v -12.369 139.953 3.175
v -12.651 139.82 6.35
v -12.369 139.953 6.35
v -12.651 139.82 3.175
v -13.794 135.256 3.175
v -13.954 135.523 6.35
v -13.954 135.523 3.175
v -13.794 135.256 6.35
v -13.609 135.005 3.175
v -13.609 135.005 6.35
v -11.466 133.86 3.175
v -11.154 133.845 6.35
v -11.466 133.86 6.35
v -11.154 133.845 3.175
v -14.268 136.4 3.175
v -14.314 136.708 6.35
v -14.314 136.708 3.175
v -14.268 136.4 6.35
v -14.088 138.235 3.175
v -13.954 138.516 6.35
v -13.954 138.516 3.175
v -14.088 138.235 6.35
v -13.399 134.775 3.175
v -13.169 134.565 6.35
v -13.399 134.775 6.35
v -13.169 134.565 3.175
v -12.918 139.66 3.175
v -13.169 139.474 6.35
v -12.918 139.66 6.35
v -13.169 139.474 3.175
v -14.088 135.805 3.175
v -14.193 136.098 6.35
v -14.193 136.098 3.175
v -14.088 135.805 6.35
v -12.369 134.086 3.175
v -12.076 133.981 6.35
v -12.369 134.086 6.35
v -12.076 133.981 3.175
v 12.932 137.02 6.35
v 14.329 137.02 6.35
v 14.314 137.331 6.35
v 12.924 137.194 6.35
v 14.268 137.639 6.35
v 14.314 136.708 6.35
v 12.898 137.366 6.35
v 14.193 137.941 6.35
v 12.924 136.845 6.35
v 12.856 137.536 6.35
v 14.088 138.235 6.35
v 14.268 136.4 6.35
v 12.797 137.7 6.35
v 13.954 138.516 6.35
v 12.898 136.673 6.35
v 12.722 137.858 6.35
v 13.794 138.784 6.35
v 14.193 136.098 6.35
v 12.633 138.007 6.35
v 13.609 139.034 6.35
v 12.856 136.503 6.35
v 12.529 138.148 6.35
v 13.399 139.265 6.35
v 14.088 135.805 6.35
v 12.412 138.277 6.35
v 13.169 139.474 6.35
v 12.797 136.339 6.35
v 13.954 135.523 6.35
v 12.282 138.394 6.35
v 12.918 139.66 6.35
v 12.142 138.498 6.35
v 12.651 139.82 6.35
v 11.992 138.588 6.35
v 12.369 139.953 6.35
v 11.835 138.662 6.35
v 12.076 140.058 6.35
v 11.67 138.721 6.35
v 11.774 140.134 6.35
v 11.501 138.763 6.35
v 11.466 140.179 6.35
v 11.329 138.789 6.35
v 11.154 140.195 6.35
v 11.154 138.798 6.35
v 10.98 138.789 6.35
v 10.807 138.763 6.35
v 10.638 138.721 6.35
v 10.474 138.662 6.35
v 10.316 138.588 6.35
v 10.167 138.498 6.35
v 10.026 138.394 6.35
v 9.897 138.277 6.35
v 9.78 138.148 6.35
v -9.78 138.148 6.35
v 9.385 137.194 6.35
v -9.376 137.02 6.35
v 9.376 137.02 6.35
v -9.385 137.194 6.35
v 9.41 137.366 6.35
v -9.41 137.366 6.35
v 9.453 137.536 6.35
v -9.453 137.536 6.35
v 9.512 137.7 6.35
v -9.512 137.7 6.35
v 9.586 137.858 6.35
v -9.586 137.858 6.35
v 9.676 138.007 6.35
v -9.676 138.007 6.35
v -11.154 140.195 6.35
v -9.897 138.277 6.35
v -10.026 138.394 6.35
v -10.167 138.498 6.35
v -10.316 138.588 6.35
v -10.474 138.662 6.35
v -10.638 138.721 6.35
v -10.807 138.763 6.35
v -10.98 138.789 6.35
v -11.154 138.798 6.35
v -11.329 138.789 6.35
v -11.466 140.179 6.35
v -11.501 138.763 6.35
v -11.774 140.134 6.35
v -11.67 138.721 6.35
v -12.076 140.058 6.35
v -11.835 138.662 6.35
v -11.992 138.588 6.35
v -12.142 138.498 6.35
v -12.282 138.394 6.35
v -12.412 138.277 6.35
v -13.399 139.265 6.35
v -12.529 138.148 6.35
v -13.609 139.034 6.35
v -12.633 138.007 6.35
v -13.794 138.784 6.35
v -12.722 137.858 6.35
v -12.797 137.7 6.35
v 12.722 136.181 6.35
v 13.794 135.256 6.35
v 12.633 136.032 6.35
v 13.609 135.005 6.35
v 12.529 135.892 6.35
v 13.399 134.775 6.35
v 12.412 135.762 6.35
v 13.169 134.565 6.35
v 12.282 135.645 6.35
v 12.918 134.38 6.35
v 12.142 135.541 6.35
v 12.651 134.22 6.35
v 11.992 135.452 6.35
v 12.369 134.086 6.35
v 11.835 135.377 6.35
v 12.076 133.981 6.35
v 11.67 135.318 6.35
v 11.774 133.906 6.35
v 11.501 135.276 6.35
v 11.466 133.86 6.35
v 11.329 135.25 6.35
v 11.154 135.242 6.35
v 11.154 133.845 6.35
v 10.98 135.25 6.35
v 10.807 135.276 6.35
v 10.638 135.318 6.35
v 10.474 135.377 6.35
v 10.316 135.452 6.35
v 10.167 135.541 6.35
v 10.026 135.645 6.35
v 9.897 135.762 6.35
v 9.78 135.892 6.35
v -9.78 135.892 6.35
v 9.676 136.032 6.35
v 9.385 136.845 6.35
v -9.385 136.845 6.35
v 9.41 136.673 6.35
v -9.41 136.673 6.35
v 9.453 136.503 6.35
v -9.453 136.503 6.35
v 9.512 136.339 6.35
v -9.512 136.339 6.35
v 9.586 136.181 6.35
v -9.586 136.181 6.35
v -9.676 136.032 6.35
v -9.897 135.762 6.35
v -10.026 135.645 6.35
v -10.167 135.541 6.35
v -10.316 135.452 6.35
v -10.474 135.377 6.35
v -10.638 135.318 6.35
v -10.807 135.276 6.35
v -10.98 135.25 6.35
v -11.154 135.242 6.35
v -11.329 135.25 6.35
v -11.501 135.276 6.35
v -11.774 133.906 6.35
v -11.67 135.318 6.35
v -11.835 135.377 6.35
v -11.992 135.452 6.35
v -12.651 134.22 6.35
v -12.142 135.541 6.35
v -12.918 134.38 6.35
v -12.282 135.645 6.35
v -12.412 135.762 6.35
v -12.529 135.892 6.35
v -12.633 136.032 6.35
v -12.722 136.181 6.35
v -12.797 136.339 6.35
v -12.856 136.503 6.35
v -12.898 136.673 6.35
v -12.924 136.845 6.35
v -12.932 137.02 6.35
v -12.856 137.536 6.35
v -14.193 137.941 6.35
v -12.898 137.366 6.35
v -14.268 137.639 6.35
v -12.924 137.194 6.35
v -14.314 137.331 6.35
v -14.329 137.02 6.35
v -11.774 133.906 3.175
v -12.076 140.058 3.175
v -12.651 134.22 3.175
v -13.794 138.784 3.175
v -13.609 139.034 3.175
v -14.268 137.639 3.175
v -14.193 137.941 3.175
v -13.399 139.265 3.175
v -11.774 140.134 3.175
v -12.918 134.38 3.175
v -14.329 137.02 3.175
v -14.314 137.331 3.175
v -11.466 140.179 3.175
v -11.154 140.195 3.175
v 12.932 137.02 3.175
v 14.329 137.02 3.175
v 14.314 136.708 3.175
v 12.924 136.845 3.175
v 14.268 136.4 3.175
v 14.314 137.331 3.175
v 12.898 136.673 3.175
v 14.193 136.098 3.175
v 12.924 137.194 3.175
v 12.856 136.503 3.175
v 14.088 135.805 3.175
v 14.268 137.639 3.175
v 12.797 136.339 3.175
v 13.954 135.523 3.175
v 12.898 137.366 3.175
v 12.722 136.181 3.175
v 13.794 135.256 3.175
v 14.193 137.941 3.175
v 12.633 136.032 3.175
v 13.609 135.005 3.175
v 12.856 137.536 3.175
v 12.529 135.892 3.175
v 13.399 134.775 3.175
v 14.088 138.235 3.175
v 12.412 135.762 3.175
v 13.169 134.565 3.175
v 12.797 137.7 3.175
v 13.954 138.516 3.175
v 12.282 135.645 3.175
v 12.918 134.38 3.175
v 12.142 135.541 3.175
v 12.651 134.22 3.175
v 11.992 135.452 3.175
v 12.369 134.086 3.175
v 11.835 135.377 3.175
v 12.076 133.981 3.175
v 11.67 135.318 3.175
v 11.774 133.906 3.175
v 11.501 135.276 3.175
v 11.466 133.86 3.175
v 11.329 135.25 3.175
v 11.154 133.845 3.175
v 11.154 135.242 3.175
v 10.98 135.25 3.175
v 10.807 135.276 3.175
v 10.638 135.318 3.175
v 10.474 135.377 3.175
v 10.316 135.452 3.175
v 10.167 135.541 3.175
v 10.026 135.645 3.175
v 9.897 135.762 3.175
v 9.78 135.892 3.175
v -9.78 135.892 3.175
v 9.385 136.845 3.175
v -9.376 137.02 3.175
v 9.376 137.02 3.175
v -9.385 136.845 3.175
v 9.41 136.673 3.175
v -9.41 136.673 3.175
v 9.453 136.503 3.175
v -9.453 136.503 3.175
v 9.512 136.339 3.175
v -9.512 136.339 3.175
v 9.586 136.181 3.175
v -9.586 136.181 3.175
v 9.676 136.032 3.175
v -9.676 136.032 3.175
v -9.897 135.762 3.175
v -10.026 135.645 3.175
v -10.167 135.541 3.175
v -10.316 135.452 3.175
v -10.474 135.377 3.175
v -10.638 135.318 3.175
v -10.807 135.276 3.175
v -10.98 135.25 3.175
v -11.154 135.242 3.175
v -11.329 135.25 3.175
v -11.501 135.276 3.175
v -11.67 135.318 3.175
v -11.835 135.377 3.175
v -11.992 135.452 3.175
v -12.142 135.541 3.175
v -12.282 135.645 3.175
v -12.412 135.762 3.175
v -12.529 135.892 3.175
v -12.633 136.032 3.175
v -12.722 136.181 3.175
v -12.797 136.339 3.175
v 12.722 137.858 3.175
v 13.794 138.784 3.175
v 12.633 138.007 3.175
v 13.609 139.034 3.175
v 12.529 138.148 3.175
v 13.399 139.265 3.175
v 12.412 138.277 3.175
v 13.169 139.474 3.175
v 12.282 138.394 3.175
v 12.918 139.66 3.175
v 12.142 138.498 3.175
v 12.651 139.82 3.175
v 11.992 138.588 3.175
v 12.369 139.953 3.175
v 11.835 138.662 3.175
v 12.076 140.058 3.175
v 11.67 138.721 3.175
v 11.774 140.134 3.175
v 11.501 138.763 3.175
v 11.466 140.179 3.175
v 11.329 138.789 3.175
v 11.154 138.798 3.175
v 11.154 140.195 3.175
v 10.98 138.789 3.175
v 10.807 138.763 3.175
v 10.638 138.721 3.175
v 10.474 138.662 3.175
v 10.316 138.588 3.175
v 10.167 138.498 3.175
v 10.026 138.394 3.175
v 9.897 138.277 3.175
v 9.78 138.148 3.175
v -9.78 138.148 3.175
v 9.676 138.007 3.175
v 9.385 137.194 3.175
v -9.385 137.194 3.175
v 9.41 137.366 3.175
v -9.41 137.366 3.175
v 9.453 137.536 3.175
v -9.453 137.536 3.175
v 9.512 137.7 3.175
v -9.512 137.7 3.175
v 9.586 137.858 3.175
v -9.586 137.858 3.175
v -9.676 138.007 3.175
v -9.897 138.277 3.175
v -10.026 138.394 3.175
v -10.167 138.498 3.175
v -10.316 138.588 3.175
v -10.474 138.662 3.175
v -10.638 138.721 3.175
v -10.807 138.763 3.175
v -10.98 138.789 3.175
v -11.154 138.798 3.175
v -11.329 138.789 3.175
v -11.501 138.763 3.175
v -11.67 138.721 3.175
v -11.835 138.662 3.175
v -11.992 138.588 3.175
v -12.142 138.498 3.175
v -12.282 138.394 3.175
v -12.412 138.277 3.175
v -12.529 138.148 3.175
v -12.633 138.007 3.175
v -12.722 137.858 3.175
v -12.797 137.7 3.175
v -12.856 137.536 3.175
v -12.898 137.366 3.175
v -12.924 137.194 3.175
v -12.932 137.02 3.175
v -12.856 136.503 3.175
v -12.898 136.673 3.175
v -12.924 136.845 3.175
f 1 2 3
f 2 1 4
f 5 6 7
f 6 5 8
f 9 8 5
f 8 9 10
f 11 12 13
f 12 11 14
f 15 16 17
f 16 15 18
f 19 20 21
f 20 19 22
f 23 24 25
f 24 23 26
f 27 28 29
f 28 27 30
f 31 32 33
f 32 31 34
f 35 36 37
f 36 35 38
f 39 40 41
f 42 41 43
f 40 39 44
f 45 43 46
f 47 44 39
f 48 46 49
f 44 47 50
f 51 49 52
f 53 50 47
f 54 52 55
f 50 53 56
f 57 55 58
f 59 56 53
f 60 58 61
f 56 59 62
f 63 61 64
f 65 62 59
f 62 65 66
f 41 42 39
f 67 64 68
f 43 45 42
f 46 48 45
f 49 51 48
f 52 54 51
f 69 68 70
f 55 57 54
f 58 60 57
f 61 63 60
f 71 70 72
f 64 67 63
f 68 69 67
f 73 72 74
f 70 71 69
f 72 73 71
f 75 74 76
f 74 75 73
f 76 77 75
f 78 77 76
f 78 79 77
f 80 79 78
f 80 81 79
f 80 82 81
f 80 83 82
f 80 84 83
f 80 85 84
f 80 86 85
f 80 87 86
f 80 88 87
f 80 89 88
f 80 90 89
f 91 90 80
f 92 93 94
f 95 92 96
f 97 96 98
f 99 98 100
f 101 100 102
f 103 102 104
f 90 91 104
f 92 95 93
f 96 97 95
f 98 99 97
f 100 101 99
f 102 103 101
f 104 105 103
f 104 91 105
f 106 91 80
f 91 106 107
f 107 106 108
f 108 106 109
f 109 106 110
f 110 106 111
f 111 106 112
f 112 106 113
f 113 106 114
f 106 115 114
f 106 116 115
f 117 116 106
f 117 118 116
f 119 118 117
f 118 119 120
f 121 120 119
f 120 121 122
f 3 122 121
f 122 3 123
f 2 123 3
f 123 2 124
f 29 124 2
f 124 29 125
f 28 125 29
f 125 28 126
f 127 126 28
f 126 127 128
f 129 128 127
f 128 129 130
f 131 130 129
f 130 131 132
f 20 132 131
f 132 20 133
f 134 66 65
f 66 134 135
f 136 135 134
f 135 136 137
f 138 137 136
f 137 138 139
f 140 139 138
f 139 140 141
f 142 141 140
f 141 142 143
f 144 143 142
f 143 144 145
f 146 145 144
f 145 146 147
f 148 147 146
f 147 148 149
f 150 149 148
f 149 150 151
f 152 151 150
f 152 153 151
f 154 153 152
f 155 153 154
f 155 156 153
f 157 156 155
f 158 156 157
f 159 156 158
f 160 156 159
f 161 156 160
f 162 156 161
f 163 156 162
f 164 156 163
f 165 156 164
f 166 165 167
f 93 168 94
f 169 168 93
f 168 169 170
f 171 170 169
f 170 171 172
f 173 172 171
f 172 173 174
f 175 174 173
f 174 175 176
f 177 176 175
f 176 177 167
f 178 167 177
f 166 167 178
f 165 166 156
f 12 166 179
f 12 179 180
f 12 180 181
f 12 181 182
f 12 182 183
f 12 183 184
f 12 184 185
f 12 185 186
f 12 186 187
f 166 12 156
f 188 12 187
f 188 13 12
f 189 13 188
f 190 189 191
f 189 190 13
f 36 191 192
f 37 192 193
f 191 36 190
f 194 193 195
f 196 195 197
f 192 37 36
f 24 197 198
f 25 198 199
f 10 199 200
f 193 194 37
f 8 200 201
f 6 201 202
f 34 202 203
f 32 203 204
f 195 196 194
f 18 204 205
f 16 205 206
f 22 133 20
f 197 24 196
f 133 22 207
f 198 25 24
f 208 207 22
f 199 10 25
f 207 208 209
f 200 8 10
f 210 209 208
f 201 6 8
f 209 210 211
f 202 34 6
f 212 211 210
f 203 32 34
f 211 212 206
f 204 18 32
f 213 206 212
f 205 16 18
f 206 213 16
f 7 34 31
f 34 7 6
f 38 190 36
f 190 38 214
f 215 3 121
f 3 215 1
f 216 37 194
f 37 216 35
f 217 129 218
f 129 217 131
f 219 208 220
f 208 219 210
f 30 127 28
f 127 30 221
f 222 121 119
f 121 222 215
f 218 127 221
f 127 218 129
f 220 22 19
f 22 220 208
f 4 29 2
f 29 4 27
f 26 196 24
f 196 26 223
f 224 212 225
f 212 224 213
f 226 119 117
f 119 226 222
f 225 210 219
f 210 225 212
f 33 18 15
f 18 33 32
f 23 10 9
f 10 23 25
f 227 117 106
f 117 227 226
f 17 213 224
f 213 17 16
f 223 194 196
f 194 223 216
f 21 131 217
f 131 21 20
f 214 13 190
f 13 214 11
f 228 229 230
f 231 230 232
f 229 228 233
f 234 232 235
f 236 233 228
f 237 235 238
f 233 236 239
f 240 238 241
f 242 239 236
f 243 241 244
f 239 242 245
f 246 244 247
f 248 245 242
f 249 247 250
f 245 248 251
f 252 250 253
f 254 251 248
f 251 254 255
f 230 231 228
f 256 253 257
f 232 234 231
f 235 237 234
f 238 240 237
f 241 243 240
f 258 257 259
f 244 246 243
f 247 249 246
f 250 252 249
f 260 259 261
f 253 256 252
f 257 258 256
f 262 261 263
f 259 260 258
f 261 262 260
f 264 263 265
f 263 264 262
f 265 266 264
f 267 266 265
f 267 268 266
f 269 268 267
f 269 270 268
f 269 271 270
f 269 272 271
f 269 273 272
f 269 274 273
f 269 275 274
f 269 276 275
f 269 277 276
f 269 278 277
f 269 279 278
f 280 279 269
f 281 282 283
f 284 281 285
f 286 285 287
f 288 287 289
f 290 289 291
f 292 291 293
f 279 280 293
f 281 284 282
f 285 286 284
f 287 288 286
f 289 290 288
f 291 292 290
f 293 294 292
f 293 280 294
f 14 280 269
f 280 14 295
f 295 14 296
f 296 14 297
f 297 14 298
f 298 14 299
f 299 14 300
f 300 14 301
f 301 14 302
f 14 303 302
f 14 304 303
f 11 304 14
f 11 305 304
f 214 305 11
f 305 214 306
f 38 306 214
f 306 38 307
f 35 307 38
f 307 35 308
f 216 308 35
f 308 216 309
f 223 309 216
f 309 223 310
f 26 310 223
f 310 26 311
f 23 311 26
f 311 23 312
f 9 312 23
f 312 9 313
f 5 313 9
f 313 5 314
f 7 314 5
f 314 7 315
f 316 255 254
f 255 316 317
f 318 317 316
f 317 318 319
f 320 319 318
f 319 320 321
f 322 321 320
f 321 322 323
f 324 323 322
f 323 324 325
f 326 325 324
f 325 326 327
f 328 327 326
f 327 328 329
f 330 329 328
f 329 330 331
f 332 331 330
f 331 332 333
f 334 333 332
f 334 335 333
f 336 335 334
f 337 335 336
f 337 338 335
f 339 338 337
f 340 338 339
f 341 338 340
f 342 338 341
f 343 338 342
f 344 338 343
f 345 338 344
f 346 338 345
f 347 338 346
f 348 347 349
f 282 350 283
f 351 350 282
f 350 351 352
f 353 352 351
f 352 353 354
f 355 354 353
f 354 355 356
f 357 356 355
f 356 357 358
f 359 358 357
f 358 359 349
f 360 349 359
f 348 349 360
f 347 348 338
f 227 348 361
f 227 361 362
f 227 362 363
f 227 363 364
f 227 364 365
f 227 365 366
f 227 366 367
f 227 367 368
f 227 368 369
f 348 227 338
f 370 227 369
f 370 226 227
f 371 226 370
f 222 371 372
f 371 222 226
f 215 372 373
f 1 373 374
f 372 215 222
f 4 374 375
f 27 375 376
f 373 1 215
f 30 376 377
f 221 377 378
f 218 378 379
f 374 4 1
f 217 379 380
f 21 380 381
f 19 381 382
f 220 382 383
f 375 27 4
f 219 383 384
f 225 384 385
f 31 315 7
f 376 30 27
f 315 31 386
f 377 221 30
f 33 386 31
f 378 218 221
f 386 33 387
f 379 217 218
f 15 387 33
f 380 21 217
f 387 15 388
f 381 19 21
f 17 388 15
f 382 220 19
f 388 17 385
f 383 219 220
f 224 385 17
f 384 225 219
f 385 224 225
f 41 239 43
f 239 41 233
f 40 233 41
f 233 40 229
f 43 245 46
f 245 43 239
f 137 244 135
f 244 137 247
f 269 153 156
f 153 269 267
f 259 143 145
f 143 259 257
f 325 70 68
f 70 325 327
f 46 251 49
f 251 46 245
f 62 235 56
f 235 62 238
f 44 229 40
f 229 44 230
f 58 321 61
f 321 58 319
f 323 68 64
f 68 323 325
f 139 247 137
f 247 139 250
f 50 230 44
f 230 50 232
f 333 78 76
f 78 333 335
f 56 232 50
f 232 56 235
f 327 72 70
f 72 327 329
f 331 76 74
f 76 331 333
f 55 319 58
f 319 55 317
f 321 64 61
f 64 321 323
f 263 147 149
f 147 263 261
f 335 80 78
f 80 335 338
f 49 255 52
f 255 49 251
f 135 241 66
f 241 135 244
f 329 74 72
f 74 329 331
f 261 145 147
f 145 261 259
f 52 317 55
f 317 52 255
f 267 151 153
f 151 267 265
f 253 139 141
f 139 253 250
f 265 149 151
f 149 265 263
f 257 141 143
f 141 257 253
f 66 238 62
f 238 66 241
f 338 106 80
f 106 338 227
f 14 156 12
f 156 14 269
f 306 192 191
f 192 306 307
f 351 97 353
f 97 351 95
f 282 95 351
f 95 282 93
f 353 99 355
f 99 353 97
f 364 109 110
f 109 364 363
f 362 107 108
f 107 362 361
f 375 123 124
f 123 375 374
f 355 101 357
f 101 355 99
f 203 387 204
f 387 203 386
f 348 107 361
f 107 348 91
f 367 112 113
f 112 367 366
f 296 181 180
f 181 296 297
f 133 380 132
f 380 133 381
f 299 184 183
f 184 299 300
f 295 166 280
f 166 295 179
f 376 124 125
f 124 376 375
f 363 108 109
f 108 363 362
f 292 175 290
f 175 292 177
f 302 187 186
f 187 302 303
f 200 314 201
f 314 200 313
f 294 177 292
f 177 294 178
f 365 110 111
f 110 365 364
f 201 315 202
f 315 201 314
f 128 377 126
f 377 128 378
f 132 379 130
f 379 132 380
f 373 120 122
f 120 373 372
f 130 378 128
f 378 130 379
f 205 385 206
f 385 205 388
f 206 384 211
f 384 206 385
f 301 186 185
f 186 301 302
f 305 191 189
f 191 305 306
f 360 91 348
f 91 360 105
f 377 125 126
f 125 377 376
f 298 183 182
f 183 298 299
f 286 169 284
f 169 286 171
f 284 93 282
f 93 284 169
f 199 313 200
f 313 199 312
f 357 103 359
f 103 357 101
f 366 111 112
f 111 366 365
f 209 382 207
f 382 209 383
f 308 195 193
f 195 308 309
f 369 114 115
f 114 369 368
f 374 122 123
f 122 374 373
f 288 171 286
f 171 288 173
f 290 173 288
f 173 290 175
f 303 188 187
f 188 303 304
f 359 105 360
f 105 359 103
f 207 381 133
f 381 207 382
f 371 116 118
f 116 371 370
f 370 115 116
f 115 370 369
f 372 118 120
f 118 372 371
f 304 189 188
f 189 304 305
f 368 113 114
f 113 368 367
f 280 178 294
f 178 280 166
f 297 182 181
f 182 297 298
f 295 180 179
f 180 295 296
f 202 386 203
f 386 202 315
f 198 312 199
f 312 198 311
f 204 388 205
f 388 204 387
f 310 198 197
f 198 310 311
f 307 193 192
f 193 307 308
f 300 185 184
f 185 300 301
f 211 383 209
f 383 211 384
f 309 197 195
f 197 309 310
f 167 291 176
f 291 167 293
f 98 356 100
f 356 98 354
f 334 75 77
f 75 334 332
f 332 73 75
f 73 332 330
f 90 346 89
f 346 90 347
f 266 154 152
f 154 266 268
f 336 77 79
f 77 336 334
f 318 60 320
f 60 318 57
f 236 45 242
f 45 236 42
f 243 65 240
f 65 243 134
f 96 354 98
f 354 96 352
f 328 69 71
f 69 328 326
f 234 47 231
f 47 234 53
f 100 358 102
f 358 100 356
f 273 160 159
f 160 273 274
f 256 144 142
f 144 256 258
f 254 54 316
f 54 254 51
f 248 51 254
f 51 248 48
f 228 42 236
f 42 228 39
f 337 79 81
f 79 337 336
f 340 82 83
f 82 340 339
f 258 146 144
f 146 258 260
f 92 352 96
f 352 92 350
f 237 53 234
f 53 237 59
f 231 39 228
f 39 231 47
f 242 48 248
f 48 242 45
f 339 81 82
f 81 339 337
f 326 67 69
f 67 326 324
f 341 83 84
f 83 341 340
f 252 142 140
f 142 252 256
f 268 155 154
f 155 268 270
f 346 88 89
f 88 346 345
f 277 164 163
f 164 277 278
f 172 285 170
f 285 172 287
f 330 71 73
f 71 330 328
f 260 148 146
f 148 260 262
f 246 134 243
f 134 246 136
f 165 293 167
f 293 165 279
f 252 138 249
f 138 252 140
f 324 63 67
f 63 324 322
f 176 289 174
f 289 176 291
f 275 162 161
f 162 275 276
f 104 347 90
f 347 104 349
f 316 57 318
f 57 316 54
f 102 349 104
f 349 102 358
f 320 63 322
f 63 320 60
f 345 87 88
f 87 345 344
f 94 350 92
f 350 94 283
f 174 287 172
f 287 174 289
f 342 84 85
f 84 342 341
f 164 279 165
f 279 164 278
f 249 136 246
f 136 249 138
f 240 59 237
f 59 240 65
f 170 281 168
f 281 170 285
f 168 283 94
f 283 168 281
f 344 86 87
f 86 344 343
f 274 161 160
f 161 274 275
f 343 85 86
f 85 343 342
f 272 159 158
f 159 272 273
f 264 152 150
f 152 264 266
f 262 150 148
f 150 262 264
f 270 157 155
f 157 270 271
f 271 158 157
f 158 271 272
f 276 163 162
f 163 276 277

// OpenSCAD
$fn = 64;
e = 0.1;
mm = 25.4;

show_wheels = 0;
show_brackets = 0;
show_chassis = 0;
show_both_sides = 0;
short_chassis = 0;
show_crossbar = 1;

pivot_hole = 0.14*mm;

// angle to steer
// steer_angle = ($t-0.5)*20;
steer_angle = 0;

// update to actual wheels
wheel_dia = 2.0*mm;
wheel_wid = 1*mm;
vehicle_wid = 4.0*mm;

wheelbase = 6.142*mm;

axle_dia = 0.35*mm;
axle_len = wheel_wid + 0.5*mm;

wheel_pivot_offset = 0.5*mm;

pivot_spc = vehicle_wid-2*wheel_wid-2*wheel_pivot_offset;
angle = atan2(wheelbase,pivot_spc/2);

bracket_stock_wid = 0.25*mm;
bracket_arm_len = 0.75*mm;
bracket_stock_thk = 0.125*mm;

// reference point where differential would be
//color("red") cylinder( h=30, d=1);

chassis_len = 7.5*mm;
chassis_thk = 0.125*mm;
chassis_tab_wid = 1.375*mm;
chassis_tab_len = 1.75*mm;

w = vehicle_wid;
l = chassis_len;
b = chassis_tab_len;
d = chassis_tab_wid;
a = (vehicle_wid-chassis_tab_wid)/2;
c = l-2*b;
pts_s = [ [0, b+c], [a, b+c], [a, l], [a+d, l], [a+d, l-b],
	  [0, b+c ]];
pts_l = [ [a, 0], [a, b], [0, b], [0, b+c], [a, b+c], [a, l],
	  [a+d, l], [a+d, l-b], [w, l-b], [w, b], [w-a, b],
	  [w-a, 0], [a, 0]];

module chassis() {
     if( short_chassis) 
	  linear_extrude( height=chassis_thk) polygon( points = pts_s);
     else
	  linear_extrude( height=chassis_thk) polygon( points = pts_l);
}

module crossbar() {
  // calculate endpoints of steering bar
  // left wheel
  left_x = wheel_pivot_offset-(vehicle_wid/2-wheel_wid) +
     cos(angle-steer_angle) * bracket_arm_len;
  left_y = wheelbase - sin(angle) * bracket_arm_len;
  left_z = 0;

  // right wheel
  right_x = -(wheel_pivot_offset-(vehicle_wid/2-wheel_wid) +
	      cos(angle+steer_angle) * bracket_arm_len);
  right_y = wheelbase - sin(angle) * bracket_arm_len;
  right_z = 0;

  crossbar_len = right_x - left_x;


  // draw the crossbar
  difference() {
       translate( [left_x, left_y, left_z+bracket_stock_thk]) {
	    // rounded ends
	    cylinder( d=bracket_stock_wid, h=bracket_stock_thk);
	    translate( [crossbar_len, 0, 0])
		 cylinder( d=bracket_stock_wid, h=bracket_stock_thk);
	    translate( [0, -bracket_stock_wid/2, 0])
		 cube( [crossbar_len, bracket_stock_wid, bracket_stock_thk]);
       }
       // indicate the pivot points
       translate( [left_x, left_y, -10]) cylinder( d=pivot_hole, h=20);
       translate( [right_x, right_y, -10]) cylinder( d=pivot_hole, h=20);
  }
       
}

// create a steering bracket
module bracket() {

     translate( [-wheel_pivot_offset, -bracket_stock_wid/2, 0])
	  cube( [wheel_pivot_offset, bracket_stock_wid, bracket_stock_thk]);

     rotate( [0, 0, -angle]) {
       translate( [0, -bracket_stock_wid/2, 0]) {
	    difference() {
		 union() {
		      cube( [bracket_arm_len, bracket_stock_wid, bracket_stock_thk]);
		      translate( [bracket_arm_len, bracket_stock_wid/2, 0])
			   cylinder( h=bracket_stock_thk, d=bracket_stock_wid);
		 }
		 translate( [bracket_arm_len, bracket_stock_wid/2, -1])
		      cylinder( d=pivot_hole, h=10);
	    }
       }
     }
     cylinder( h=bracket_stock_thk, d=bracket_stock_wid);
}


module wheel_at( x, y, z, steer) {
  translate( [ x+wheel_pivot_offset, y, z]) {
    rotate( [0, 0, steer]) {
      translate( [-wheel_pivot_offset, 0, 0]) {
	rotate( [0, 270, 0]) {
	     if( show_wheels) {
	     % cylinder( d=wheel_dia, h=wheel_wid);
		  translate( [0, 0, -(axle_len-wheel_wid)/2])
		       color("green") cylinder( d=axle_dia, h=axle_len);
	     }
	}
	// bracket with steering pivot
	if( show_brackets)
	translate( [wheel_pivot_offset, 0, -bracket_stock_thk/2]) {
	     difference() {
		  bracket();
		  translate( [0, 0, -1])
		       cylinder( d=pivot_hole, h=10);
	     }
	}
      }
    }
  }
}

// left front wheel
wheel_at( -(vehicle_wid/2-wheel_wid), wheelbase, 0, steer_angle);
// right front wheel
if( show_both_sides)
     mirror( [1, 0 ,0]) wheel_at( -(vehicle_wid/2-wheel_wid), wheelbase, 0, -steer_angle);

if( show_crossbar) crossbar();
if( show_chassis) {
     difference() {
	  translate( [-vehicle_wid/2, -chassis_tab_len/2, -5]) color("green") chassis();
	  translate( [-(vehicle_wid/2-wheel_wid)+wheel_pivot_offset, wheelbase, -10]) cylinder( d=pivot_hole, h=20);
	  mirror( [1, 0 ,0]) translate( [wheel_pivot_offset-(vehicle_wid/2-wheel_wid), wheelbase, -10]) cylinder( d=pivot_hole, h=20);
     }
}
